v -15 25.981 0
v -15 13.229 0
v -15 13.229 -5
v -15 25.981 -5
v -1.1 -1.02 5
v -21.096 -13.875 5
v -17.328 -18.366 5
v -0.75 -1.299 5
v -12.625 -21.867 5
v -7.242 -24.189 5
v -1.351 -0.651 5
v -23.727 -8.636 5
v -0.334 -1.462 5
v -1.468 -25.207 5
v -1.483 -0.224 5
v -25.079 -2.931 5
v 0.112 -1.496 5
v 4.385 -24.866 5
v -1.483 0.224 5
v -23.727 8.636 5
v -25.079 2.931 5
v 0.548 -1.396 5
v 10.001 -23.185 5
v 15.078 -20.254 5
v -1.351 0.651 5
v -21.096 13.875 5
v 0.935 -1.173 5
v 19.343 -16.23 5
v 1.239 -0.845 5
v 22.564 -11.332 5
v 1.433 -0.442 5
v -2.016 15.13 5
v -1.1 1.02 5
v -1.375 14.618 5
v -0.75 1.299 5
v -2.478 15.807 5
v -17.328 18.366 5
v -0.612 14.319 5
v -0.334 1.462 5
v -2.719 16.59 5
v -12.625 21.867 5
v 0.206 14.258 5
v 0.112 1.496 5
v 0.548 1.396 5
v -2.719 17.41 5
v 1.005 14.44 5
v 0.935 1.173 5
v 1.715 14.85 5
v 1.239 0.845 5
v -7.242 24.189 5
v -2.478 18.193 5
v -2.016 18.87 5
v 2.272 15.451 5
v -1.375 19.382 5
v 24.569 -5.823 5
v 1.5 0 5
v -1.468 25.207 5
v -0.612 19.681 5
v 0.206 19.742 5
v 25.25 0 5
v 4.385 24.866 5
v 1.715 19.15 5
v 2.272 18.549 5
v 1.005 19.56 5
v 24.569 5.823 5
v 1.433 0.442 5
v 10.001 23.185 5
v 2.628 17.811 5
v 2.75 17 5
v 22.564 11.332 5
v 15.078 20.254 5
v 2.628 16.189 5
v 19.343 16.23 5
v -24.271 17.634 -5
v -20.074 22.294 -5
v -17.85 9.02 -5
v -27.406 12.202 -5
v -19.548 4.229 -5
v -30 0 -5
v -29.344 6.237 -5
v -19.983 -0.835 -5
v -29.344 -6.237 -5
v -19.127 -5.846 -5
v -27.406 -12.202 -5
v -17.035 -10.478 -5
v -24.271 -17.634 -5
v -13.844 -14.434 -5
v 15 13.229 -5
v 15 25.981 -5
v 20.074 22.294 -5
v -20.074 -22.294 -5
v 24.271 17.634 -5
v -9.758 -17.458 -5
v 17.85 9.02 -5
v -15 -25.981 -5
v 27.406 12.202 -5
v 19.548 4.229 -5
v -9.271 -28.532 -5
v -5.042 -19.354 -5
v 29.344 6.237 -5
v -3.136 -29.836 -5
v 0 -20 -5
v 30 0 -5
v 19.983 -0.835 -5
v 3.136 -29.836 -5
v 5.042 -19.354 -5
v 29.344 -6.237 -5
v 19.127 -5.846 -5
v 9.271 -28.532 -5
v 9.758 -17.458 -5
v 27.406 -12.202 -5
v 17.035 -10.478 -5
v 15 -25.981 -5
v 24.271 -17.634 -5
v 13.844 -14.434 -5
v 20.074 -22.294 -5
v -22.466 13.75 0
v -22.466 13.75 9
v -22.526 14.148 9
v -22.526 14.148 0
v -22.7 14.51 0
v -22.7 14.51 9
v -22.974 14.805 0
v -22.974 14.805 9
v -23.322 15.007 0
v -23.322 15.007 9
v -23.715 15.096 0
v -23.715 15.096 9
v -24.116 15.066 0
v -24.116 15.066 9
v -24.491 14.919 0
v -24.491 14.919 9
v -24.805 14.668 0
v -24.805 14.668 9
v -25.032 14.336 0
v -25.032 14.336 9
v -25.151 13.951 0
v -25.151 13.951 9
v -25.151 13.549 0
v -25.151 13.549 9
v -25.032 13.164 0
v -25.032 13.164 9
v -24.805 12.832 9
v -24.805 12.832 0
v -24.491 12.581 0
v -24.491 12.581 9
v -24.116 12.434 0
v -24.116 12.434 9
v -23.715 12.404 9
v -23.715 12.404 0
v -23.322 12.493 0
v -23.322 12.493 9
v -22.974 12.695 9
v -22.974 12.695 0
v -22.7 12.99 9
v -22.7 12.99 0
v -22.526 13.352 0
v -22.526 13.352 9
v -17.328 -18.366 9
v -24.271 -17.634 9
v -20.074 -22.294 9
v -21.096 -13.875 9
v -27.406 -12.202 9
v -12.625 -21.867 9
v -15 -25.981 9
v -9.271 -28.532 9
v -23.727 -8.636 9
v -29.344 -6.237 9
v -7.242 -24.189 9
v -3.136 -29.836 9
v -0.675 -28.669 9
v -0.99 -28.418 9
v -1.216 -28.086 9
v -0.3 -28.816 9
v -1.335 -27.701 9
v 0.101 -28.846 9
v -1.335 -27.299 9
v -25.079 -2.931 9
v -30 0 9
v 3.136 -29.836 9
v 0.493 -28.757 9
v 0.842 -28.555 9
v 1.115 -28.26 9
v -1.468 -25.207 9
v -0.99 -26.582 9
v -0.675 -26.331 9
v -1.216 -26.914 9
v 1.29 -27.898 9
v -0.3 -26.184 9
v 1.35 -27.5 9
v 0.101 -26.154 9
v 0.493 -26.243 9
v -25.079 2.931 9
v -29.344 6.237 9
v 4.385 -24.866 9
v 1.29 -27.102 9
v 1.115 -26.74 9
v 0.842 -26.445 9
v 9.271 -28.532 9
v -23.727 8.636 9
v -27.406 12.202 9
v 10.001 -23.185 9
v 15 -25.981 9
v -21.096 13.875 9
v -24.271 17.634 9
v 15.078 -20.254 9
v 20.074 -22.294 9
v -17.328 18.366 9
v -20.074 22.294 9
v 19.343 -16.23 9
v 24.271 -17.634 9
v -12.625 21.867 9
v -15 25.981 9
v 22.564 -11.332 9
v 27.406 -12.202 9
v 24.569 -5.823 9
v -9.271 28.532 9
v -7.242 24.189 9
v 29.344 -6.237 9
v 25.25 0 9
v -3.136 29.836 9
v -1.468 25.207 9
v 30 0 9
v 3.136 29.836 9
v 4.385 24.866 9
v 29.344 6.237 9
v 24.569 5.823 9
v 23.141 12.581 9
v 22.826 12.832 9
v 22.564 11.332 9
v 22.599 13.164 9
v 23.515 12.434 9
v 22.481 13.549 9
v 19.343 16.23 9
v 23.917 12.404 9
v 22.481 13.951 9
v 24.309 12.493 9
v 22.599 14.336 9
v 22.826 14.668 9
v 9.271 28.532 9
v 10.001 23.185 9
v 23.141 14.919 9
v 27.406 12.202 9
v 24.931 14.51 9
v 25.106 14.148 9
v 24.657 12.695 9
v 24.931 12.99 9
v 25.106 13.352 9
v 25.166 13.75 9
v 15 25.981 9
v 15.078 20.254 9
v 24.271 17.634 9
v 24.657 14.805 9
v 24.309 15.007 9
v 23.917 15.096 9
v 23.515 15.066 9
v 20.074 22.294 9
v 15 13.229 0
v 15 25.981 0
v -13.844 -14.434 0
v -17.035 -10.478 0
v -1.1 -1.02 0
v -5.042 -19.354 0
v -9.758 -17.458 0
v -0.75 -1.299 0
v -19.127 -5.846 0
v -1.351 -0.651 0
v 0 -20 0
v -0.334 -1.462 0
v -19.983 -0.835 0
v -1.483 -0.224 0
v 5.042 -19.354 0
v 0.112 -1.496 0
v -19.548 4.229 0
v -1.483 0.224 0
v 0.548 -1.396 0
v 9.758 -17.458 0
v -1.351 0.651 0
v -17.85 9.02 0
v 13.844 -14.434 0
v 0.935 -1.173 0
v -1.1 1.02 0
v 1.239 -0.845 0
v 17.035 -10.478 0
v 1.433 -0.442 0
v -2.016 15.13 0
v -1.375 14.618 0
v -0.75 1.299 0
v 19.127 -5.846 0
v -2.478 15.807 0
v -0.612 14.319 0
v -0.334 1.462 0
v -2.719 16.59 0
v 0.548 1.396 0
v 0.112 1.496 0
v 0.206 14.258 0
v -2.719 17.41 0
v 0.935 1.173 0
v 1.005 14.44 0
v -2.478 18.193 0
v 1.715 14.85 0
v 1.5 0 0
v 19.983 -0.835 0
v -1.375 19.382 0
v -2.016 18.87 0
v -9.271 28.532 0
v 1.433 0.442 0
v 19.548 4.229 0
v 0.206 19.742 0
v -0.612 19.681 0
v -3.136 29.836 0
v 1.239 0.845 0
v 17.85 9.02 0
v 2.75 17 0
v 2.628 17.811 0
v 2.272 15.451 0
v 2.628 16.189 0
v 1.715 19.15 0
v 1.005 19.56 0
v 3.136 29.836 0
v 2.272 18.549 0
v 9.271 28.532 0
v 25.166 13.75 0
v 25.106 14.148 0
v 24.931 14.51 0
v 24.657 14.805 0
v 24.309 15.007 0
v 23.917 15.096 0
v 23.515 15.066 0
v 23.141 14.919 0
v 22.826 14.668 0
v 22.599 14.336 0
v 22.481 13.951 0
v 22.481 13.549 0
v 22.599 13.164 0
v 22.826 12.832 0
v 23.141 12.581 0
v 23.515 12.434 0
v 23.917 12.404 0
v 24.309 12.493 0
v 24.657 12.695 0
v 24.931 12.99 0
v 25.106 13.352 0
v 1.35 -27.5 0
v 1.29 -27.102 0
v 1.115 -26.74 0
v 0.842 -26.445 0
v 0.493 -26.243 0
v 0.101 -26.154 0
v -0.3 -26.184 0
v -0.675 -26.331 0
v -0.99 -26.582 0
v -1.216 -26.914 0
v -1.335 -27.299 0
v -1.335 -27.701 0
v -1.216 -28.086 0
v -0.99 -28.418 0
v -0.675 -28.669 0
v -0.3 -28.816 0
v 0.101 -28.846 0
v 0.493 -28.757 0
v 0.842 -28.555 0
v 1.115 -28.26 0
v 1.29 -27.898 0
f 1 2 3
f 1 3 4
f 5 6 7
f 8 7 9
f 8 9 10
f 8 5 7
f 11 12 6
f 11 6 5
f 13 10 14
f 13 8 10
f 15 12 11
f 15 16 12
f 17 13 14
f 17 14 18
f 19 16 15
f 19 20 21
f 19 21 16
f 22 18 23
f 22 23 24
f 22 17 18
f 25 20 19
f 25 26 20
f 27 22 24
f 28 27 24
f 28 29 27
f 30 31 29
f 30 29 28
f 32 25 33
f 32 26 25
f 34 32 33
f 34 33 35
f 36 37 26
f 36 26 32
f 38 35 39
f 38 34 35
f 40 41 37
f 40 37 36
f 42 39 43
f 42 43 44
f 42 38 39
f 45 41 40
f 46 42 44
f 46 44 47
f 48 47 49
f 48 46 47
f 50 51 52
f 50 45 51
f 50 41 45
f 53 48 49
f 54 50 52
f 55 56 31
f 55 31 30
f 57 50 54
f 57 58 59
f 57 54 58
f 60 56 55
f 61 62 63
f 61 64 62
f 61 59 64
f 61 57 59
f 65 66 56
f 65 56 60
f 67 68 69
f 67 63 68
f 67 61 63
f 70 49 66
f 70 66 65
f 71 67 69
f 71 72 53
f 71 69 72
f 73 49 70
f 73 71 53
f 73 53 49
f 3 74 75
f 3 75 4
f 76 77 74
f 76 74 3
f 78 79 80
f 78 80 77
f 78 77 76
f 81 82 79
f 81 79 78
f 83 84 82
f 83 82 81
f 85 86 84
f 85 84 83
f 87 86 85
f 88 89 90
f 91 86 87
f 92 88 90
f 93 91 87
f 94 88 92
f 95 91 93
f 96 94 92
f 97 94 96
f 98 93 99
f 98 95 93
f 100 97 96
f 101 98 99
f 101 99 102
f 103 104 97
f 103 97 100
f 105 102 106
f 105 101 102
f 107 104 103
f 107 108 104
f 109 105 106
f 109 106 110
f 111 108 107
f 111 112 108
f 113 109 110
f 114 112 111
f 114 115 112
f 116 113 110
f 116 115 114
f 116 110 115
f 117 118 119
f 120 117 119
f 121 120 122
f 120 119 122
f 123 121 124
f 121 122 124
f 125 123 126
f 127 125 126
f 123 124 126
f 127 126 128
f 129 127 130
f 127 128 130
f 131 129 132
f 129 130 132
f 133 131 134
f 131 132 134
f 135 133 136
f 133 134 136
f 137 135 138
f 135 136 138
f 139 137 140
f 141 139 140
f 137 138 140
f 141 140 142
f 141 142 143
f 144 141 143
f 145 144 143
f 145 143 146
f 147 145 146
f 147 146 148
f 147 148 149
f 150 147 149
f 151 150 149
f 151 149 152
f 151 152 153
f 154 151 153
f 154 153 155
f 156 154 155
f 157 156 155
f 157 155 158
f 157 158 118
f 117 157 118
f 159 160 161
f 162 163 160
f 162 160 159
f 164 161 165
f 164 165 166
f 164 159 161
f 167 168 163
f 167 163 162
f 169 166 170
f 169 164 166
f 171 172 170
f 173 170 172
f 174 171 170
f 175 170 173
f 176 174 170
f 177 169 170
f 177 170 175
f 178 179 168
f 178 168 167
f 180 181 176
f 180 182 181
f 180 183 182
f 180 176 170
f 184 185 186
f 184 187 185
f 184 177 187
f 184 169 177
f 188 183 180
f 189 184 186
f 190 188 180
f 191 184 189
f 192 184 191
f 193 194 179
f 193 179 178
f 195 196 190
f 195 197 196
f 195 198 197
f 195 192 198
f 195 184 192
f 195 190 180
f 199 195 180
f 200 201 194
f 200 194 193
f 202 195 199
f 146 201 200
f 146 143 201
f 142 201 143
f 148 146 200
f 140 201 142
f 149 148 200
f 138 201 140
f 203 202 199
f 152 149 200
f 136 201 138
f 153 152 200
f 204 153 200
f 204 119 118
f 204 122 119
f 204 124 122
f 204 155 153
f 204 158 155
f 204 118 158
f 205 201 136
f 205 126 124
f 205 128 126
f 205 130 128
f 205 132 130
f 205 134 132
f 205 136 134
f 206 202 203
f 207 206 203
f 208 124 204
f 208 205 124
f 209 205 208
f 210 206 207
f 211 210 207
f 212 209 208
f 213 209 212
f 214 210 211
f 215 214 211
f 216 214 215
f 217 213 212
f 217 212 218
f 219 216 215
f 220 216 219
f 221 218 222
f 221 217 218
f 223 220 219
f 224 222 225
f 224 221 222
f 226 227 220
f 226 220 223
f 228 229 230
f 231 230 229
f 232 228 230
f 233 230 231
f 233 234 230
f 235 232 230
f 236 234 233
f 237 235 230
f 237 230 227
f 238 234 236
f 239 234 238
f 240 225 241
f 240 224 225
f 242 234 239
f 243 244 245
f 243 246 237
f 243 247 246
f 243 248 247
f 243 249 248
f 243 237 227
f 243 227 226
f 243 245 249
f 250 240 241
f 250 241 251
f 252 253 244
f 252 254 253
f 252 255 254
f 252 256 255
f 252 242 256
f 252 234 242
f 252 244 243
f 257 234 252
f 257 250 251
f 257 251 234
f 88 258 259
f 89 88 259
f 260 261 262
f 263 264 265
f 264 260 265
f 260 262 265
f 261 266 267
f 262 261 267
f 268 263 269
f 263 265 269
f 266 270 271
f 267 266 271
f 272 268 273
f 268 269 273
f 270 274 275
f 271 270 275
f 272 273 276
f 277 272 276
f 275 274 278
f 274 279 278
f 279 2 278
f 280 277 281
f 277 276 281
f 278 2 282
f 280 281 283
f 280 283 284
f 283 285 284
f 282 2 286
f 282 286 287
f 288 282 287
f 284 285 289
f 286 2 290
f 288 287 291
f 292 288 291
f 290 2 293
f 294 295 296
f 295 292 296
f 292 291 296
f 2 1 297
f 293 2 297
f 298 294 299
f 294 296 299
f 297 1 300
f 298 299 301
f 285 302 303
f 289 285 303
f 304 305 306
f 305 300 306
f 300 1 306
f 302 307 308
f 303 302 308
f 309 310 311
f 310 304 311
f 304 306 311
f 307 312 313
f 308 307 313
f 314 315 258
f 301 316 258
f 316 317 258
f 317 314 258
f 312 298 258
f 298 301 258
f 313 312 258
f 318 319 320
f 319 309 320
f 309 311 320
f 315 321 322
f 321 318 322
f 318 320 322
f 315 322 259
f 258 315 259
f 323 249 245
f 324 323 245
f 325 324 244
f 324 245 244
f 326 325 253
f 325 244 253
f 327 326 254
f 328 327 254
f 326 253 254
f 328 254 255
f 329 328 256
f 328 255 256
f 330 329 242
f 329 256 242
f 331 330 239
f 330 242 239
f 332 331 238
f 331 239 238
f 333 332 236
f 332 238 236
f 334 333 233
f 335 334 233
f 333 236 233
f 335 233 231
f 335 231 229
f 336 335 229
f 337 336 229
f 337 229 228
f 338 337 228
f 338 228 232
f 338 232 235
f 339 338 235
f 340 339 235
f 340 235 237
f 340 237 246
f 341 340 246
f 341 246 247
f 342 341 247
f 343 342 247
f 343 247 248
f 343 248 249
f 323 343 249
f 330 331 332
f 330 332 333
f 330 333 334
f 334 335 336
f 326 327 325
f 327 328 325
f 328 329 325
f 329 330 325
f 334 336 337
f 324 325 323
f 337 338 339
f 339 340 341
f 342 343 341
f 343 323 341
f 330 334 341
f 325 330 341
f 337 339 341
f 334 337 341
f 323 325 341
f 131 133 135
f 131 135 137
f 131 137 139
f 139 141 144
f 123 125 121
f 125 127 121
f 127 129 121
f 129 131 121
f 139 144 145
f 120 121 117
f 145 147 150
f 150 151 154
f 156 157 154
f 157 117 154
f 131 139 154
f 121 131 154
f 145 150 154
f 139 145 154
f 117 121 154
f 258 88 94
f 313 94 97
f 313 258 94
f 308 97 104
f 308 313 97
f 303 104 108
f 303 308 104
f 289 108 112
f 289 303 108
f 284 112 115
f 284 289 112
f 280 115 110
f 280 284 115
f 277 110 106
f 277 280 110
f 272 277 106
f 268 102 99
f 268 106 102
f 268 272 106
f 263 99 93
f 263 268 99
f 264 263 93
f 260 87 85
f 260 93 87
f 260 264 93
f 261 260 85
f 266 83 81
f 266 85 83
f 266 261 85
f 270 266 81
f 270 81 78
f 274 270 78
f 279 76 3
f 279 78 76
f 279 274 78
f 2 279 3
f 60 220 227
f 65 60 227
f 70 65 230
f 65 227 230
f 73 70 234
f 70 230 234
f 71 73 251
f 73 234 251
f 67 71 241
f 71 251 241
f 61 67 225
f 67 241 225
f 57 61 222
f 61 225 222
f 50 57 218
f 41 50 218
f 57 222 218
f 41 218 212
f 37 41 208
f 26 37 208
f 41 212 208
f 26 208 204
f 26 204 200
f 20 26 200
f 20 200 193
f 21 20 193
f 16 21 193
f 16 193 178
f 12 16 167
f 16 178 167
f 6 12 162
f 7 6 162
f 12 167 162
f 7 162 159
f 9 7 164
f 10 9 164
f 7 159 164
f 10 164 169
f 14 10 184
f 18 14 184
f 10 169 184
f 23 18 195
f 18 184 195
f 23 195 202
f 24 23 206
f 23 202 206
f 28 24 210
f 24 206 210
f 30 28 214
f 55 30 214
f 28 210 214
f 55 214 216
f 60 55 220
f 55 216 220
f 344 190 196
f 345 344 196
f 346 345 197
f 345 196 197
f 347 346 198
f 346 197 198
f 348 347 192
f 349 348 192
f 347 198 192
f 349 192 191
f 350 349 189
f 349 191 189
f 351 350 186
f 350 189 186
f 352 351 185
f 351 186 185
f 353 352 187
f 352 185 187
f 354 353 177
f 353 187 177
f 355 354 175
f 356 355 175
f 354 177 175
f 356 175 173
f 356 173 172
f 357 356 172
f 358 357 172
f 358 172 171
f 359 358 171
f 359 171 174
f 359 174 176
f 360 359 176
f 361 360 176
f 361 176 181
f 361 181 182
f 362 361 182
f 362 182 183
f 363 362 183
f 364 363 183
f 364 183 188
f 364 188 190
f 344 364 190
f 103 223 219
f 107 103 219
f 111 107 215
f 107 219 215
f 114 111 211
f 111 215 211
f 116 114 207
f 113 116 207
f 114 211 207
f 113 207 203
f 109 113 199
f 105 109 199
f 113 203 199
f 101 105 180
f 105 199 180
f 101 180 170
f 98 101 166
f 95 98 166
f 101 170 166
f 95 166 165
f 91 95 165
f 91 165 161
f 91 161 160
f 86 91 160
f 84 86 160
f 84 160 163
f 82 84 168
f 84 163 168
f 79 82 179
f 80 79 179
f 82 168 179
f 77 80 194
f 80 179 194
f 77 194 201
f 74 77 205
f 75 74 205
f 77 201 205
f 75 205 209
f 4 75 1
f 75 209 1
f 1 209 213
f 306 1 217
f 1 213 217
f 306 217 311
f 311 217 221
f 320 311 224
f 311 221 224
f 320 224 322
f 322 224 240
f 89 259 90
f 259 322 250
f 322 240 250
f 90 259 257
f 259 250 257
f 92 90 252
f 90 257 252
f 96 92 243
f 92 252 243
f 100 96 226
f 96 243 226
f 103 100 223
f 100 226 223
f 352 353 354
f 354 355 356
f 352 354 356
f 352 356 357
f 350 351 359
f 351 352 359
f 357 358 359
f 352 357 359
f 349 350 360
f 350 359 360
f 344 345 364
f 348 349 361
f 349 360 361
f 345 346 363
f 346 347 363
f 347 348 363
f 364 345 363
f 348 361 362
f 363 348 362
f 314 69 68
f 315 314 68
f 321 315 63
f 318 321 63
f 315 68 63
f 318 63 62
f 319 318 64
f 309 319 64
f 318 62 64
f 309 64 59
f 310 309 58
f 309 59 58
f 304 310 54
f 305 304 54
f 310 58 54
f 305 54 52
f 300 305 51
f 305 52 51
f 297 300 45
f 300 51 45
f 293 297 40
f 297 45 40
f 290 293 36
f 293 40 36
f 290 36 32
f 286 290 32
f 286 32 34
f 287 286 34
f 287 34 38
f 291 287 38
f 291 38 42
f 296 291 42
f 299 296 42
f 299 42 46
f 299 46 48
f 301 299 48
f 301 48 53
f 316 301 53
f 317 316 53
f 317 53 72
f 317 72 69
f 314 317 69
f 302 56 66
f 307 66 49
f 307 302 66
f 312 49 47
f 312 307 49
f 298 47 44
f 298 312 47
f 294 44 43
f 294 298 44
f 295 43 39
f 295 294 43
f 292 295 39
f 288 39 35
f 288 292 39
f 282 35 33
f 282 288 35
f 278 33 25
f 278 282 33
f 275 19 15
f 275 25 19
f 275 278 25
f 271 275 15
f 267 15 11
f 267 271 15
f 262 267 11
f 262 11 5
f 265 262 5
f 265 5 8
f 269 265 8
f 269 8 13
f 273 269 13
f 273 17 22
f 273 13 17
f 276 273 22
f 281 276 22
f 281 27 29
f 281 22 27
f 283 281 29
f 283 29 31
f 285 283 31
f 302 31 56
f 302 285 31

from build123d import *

# Parameters (mm, degrees)
F0_R      = 30
F1_DEPTH  = 9
F2_R      = 25.25
F3_DEPTH  = 4
F4_R      = 1.5
F5_DEPTH  = 9.001
F6_R      = 1.35
F7_DEPTH  = 9.001
F8_R      = 2.75
F9_DEPTH  = 5.001
F10_R     = 30
F10_R_2   = 20
F11_DEPTH = 5
F12_W     = 30
F12_H     = 24.764763
F13_DEPTH = 5


with BuildPart() as f1:
    # F0 (on Top) → F1 (new body)
    with BuildSketch(Plane.XY):
        Circle(F0_R)
    extrude(amount=F1_DEPTH)

    # F2 (on face) → F3 (cut)
    with BuildSketch(Plane.XY.offset(9)):
        Circle(F2_R)
    extrude(amount=-F3_DEPTH, mode=Mode.SUBTRACT)

    # F4 (on Top) → F5 (cut, through all)
    with BuildSketch(Plane.XY):
        Circle(F4_R)
    extrude(amount=F5_DEPTH, mode=Mode.SUBTRACT)

    # F6 (on face) → F7 (cut, through all)
    with BuildSketch(Plane.XY.offset(9)):
        with Locations((23.815699, 13.75)):
            Circle(F6_R)
        with Locations((0, -27.5)):
            Circle(F6_R)
        with Locations((-23.815699, 13.75)):
            Circle(F6_R)
    extrude(amount=-F7_DEPTH, mode=Mode.SUBTRACT)

    # F8 (on face) → F9 (cut, through all)
    with BuildSketch(Plane.XY.offset(5)):
        with Locations((0, 17)):
            Circle(F8_R)
    extrude(amount=-F9_DEPTH, mode=Mode.SUBTRACT)

    # F10 (on face) → F11 (join)
    with BuildSketch(Plane(origin=(0, 0, 0), x_dir=(1, 0, 0), z_dir=(0, 0, -1))):
        Circle(F10_R)
        Circle(F10_R_2, mode=Mode.SUBTRACT)
    extrude(amount=F11_DEPTH)

    # F12 (on Top) → F13 (cut)
    with BuildSketch(Plane.XY):
        with Locations((0, 20.9111)):
            Rectangle(F12_W, F12_H)
    extrude(amount=-F13_DEPTH, mode=Mode.SUBTRACT)


solid = f1.part
